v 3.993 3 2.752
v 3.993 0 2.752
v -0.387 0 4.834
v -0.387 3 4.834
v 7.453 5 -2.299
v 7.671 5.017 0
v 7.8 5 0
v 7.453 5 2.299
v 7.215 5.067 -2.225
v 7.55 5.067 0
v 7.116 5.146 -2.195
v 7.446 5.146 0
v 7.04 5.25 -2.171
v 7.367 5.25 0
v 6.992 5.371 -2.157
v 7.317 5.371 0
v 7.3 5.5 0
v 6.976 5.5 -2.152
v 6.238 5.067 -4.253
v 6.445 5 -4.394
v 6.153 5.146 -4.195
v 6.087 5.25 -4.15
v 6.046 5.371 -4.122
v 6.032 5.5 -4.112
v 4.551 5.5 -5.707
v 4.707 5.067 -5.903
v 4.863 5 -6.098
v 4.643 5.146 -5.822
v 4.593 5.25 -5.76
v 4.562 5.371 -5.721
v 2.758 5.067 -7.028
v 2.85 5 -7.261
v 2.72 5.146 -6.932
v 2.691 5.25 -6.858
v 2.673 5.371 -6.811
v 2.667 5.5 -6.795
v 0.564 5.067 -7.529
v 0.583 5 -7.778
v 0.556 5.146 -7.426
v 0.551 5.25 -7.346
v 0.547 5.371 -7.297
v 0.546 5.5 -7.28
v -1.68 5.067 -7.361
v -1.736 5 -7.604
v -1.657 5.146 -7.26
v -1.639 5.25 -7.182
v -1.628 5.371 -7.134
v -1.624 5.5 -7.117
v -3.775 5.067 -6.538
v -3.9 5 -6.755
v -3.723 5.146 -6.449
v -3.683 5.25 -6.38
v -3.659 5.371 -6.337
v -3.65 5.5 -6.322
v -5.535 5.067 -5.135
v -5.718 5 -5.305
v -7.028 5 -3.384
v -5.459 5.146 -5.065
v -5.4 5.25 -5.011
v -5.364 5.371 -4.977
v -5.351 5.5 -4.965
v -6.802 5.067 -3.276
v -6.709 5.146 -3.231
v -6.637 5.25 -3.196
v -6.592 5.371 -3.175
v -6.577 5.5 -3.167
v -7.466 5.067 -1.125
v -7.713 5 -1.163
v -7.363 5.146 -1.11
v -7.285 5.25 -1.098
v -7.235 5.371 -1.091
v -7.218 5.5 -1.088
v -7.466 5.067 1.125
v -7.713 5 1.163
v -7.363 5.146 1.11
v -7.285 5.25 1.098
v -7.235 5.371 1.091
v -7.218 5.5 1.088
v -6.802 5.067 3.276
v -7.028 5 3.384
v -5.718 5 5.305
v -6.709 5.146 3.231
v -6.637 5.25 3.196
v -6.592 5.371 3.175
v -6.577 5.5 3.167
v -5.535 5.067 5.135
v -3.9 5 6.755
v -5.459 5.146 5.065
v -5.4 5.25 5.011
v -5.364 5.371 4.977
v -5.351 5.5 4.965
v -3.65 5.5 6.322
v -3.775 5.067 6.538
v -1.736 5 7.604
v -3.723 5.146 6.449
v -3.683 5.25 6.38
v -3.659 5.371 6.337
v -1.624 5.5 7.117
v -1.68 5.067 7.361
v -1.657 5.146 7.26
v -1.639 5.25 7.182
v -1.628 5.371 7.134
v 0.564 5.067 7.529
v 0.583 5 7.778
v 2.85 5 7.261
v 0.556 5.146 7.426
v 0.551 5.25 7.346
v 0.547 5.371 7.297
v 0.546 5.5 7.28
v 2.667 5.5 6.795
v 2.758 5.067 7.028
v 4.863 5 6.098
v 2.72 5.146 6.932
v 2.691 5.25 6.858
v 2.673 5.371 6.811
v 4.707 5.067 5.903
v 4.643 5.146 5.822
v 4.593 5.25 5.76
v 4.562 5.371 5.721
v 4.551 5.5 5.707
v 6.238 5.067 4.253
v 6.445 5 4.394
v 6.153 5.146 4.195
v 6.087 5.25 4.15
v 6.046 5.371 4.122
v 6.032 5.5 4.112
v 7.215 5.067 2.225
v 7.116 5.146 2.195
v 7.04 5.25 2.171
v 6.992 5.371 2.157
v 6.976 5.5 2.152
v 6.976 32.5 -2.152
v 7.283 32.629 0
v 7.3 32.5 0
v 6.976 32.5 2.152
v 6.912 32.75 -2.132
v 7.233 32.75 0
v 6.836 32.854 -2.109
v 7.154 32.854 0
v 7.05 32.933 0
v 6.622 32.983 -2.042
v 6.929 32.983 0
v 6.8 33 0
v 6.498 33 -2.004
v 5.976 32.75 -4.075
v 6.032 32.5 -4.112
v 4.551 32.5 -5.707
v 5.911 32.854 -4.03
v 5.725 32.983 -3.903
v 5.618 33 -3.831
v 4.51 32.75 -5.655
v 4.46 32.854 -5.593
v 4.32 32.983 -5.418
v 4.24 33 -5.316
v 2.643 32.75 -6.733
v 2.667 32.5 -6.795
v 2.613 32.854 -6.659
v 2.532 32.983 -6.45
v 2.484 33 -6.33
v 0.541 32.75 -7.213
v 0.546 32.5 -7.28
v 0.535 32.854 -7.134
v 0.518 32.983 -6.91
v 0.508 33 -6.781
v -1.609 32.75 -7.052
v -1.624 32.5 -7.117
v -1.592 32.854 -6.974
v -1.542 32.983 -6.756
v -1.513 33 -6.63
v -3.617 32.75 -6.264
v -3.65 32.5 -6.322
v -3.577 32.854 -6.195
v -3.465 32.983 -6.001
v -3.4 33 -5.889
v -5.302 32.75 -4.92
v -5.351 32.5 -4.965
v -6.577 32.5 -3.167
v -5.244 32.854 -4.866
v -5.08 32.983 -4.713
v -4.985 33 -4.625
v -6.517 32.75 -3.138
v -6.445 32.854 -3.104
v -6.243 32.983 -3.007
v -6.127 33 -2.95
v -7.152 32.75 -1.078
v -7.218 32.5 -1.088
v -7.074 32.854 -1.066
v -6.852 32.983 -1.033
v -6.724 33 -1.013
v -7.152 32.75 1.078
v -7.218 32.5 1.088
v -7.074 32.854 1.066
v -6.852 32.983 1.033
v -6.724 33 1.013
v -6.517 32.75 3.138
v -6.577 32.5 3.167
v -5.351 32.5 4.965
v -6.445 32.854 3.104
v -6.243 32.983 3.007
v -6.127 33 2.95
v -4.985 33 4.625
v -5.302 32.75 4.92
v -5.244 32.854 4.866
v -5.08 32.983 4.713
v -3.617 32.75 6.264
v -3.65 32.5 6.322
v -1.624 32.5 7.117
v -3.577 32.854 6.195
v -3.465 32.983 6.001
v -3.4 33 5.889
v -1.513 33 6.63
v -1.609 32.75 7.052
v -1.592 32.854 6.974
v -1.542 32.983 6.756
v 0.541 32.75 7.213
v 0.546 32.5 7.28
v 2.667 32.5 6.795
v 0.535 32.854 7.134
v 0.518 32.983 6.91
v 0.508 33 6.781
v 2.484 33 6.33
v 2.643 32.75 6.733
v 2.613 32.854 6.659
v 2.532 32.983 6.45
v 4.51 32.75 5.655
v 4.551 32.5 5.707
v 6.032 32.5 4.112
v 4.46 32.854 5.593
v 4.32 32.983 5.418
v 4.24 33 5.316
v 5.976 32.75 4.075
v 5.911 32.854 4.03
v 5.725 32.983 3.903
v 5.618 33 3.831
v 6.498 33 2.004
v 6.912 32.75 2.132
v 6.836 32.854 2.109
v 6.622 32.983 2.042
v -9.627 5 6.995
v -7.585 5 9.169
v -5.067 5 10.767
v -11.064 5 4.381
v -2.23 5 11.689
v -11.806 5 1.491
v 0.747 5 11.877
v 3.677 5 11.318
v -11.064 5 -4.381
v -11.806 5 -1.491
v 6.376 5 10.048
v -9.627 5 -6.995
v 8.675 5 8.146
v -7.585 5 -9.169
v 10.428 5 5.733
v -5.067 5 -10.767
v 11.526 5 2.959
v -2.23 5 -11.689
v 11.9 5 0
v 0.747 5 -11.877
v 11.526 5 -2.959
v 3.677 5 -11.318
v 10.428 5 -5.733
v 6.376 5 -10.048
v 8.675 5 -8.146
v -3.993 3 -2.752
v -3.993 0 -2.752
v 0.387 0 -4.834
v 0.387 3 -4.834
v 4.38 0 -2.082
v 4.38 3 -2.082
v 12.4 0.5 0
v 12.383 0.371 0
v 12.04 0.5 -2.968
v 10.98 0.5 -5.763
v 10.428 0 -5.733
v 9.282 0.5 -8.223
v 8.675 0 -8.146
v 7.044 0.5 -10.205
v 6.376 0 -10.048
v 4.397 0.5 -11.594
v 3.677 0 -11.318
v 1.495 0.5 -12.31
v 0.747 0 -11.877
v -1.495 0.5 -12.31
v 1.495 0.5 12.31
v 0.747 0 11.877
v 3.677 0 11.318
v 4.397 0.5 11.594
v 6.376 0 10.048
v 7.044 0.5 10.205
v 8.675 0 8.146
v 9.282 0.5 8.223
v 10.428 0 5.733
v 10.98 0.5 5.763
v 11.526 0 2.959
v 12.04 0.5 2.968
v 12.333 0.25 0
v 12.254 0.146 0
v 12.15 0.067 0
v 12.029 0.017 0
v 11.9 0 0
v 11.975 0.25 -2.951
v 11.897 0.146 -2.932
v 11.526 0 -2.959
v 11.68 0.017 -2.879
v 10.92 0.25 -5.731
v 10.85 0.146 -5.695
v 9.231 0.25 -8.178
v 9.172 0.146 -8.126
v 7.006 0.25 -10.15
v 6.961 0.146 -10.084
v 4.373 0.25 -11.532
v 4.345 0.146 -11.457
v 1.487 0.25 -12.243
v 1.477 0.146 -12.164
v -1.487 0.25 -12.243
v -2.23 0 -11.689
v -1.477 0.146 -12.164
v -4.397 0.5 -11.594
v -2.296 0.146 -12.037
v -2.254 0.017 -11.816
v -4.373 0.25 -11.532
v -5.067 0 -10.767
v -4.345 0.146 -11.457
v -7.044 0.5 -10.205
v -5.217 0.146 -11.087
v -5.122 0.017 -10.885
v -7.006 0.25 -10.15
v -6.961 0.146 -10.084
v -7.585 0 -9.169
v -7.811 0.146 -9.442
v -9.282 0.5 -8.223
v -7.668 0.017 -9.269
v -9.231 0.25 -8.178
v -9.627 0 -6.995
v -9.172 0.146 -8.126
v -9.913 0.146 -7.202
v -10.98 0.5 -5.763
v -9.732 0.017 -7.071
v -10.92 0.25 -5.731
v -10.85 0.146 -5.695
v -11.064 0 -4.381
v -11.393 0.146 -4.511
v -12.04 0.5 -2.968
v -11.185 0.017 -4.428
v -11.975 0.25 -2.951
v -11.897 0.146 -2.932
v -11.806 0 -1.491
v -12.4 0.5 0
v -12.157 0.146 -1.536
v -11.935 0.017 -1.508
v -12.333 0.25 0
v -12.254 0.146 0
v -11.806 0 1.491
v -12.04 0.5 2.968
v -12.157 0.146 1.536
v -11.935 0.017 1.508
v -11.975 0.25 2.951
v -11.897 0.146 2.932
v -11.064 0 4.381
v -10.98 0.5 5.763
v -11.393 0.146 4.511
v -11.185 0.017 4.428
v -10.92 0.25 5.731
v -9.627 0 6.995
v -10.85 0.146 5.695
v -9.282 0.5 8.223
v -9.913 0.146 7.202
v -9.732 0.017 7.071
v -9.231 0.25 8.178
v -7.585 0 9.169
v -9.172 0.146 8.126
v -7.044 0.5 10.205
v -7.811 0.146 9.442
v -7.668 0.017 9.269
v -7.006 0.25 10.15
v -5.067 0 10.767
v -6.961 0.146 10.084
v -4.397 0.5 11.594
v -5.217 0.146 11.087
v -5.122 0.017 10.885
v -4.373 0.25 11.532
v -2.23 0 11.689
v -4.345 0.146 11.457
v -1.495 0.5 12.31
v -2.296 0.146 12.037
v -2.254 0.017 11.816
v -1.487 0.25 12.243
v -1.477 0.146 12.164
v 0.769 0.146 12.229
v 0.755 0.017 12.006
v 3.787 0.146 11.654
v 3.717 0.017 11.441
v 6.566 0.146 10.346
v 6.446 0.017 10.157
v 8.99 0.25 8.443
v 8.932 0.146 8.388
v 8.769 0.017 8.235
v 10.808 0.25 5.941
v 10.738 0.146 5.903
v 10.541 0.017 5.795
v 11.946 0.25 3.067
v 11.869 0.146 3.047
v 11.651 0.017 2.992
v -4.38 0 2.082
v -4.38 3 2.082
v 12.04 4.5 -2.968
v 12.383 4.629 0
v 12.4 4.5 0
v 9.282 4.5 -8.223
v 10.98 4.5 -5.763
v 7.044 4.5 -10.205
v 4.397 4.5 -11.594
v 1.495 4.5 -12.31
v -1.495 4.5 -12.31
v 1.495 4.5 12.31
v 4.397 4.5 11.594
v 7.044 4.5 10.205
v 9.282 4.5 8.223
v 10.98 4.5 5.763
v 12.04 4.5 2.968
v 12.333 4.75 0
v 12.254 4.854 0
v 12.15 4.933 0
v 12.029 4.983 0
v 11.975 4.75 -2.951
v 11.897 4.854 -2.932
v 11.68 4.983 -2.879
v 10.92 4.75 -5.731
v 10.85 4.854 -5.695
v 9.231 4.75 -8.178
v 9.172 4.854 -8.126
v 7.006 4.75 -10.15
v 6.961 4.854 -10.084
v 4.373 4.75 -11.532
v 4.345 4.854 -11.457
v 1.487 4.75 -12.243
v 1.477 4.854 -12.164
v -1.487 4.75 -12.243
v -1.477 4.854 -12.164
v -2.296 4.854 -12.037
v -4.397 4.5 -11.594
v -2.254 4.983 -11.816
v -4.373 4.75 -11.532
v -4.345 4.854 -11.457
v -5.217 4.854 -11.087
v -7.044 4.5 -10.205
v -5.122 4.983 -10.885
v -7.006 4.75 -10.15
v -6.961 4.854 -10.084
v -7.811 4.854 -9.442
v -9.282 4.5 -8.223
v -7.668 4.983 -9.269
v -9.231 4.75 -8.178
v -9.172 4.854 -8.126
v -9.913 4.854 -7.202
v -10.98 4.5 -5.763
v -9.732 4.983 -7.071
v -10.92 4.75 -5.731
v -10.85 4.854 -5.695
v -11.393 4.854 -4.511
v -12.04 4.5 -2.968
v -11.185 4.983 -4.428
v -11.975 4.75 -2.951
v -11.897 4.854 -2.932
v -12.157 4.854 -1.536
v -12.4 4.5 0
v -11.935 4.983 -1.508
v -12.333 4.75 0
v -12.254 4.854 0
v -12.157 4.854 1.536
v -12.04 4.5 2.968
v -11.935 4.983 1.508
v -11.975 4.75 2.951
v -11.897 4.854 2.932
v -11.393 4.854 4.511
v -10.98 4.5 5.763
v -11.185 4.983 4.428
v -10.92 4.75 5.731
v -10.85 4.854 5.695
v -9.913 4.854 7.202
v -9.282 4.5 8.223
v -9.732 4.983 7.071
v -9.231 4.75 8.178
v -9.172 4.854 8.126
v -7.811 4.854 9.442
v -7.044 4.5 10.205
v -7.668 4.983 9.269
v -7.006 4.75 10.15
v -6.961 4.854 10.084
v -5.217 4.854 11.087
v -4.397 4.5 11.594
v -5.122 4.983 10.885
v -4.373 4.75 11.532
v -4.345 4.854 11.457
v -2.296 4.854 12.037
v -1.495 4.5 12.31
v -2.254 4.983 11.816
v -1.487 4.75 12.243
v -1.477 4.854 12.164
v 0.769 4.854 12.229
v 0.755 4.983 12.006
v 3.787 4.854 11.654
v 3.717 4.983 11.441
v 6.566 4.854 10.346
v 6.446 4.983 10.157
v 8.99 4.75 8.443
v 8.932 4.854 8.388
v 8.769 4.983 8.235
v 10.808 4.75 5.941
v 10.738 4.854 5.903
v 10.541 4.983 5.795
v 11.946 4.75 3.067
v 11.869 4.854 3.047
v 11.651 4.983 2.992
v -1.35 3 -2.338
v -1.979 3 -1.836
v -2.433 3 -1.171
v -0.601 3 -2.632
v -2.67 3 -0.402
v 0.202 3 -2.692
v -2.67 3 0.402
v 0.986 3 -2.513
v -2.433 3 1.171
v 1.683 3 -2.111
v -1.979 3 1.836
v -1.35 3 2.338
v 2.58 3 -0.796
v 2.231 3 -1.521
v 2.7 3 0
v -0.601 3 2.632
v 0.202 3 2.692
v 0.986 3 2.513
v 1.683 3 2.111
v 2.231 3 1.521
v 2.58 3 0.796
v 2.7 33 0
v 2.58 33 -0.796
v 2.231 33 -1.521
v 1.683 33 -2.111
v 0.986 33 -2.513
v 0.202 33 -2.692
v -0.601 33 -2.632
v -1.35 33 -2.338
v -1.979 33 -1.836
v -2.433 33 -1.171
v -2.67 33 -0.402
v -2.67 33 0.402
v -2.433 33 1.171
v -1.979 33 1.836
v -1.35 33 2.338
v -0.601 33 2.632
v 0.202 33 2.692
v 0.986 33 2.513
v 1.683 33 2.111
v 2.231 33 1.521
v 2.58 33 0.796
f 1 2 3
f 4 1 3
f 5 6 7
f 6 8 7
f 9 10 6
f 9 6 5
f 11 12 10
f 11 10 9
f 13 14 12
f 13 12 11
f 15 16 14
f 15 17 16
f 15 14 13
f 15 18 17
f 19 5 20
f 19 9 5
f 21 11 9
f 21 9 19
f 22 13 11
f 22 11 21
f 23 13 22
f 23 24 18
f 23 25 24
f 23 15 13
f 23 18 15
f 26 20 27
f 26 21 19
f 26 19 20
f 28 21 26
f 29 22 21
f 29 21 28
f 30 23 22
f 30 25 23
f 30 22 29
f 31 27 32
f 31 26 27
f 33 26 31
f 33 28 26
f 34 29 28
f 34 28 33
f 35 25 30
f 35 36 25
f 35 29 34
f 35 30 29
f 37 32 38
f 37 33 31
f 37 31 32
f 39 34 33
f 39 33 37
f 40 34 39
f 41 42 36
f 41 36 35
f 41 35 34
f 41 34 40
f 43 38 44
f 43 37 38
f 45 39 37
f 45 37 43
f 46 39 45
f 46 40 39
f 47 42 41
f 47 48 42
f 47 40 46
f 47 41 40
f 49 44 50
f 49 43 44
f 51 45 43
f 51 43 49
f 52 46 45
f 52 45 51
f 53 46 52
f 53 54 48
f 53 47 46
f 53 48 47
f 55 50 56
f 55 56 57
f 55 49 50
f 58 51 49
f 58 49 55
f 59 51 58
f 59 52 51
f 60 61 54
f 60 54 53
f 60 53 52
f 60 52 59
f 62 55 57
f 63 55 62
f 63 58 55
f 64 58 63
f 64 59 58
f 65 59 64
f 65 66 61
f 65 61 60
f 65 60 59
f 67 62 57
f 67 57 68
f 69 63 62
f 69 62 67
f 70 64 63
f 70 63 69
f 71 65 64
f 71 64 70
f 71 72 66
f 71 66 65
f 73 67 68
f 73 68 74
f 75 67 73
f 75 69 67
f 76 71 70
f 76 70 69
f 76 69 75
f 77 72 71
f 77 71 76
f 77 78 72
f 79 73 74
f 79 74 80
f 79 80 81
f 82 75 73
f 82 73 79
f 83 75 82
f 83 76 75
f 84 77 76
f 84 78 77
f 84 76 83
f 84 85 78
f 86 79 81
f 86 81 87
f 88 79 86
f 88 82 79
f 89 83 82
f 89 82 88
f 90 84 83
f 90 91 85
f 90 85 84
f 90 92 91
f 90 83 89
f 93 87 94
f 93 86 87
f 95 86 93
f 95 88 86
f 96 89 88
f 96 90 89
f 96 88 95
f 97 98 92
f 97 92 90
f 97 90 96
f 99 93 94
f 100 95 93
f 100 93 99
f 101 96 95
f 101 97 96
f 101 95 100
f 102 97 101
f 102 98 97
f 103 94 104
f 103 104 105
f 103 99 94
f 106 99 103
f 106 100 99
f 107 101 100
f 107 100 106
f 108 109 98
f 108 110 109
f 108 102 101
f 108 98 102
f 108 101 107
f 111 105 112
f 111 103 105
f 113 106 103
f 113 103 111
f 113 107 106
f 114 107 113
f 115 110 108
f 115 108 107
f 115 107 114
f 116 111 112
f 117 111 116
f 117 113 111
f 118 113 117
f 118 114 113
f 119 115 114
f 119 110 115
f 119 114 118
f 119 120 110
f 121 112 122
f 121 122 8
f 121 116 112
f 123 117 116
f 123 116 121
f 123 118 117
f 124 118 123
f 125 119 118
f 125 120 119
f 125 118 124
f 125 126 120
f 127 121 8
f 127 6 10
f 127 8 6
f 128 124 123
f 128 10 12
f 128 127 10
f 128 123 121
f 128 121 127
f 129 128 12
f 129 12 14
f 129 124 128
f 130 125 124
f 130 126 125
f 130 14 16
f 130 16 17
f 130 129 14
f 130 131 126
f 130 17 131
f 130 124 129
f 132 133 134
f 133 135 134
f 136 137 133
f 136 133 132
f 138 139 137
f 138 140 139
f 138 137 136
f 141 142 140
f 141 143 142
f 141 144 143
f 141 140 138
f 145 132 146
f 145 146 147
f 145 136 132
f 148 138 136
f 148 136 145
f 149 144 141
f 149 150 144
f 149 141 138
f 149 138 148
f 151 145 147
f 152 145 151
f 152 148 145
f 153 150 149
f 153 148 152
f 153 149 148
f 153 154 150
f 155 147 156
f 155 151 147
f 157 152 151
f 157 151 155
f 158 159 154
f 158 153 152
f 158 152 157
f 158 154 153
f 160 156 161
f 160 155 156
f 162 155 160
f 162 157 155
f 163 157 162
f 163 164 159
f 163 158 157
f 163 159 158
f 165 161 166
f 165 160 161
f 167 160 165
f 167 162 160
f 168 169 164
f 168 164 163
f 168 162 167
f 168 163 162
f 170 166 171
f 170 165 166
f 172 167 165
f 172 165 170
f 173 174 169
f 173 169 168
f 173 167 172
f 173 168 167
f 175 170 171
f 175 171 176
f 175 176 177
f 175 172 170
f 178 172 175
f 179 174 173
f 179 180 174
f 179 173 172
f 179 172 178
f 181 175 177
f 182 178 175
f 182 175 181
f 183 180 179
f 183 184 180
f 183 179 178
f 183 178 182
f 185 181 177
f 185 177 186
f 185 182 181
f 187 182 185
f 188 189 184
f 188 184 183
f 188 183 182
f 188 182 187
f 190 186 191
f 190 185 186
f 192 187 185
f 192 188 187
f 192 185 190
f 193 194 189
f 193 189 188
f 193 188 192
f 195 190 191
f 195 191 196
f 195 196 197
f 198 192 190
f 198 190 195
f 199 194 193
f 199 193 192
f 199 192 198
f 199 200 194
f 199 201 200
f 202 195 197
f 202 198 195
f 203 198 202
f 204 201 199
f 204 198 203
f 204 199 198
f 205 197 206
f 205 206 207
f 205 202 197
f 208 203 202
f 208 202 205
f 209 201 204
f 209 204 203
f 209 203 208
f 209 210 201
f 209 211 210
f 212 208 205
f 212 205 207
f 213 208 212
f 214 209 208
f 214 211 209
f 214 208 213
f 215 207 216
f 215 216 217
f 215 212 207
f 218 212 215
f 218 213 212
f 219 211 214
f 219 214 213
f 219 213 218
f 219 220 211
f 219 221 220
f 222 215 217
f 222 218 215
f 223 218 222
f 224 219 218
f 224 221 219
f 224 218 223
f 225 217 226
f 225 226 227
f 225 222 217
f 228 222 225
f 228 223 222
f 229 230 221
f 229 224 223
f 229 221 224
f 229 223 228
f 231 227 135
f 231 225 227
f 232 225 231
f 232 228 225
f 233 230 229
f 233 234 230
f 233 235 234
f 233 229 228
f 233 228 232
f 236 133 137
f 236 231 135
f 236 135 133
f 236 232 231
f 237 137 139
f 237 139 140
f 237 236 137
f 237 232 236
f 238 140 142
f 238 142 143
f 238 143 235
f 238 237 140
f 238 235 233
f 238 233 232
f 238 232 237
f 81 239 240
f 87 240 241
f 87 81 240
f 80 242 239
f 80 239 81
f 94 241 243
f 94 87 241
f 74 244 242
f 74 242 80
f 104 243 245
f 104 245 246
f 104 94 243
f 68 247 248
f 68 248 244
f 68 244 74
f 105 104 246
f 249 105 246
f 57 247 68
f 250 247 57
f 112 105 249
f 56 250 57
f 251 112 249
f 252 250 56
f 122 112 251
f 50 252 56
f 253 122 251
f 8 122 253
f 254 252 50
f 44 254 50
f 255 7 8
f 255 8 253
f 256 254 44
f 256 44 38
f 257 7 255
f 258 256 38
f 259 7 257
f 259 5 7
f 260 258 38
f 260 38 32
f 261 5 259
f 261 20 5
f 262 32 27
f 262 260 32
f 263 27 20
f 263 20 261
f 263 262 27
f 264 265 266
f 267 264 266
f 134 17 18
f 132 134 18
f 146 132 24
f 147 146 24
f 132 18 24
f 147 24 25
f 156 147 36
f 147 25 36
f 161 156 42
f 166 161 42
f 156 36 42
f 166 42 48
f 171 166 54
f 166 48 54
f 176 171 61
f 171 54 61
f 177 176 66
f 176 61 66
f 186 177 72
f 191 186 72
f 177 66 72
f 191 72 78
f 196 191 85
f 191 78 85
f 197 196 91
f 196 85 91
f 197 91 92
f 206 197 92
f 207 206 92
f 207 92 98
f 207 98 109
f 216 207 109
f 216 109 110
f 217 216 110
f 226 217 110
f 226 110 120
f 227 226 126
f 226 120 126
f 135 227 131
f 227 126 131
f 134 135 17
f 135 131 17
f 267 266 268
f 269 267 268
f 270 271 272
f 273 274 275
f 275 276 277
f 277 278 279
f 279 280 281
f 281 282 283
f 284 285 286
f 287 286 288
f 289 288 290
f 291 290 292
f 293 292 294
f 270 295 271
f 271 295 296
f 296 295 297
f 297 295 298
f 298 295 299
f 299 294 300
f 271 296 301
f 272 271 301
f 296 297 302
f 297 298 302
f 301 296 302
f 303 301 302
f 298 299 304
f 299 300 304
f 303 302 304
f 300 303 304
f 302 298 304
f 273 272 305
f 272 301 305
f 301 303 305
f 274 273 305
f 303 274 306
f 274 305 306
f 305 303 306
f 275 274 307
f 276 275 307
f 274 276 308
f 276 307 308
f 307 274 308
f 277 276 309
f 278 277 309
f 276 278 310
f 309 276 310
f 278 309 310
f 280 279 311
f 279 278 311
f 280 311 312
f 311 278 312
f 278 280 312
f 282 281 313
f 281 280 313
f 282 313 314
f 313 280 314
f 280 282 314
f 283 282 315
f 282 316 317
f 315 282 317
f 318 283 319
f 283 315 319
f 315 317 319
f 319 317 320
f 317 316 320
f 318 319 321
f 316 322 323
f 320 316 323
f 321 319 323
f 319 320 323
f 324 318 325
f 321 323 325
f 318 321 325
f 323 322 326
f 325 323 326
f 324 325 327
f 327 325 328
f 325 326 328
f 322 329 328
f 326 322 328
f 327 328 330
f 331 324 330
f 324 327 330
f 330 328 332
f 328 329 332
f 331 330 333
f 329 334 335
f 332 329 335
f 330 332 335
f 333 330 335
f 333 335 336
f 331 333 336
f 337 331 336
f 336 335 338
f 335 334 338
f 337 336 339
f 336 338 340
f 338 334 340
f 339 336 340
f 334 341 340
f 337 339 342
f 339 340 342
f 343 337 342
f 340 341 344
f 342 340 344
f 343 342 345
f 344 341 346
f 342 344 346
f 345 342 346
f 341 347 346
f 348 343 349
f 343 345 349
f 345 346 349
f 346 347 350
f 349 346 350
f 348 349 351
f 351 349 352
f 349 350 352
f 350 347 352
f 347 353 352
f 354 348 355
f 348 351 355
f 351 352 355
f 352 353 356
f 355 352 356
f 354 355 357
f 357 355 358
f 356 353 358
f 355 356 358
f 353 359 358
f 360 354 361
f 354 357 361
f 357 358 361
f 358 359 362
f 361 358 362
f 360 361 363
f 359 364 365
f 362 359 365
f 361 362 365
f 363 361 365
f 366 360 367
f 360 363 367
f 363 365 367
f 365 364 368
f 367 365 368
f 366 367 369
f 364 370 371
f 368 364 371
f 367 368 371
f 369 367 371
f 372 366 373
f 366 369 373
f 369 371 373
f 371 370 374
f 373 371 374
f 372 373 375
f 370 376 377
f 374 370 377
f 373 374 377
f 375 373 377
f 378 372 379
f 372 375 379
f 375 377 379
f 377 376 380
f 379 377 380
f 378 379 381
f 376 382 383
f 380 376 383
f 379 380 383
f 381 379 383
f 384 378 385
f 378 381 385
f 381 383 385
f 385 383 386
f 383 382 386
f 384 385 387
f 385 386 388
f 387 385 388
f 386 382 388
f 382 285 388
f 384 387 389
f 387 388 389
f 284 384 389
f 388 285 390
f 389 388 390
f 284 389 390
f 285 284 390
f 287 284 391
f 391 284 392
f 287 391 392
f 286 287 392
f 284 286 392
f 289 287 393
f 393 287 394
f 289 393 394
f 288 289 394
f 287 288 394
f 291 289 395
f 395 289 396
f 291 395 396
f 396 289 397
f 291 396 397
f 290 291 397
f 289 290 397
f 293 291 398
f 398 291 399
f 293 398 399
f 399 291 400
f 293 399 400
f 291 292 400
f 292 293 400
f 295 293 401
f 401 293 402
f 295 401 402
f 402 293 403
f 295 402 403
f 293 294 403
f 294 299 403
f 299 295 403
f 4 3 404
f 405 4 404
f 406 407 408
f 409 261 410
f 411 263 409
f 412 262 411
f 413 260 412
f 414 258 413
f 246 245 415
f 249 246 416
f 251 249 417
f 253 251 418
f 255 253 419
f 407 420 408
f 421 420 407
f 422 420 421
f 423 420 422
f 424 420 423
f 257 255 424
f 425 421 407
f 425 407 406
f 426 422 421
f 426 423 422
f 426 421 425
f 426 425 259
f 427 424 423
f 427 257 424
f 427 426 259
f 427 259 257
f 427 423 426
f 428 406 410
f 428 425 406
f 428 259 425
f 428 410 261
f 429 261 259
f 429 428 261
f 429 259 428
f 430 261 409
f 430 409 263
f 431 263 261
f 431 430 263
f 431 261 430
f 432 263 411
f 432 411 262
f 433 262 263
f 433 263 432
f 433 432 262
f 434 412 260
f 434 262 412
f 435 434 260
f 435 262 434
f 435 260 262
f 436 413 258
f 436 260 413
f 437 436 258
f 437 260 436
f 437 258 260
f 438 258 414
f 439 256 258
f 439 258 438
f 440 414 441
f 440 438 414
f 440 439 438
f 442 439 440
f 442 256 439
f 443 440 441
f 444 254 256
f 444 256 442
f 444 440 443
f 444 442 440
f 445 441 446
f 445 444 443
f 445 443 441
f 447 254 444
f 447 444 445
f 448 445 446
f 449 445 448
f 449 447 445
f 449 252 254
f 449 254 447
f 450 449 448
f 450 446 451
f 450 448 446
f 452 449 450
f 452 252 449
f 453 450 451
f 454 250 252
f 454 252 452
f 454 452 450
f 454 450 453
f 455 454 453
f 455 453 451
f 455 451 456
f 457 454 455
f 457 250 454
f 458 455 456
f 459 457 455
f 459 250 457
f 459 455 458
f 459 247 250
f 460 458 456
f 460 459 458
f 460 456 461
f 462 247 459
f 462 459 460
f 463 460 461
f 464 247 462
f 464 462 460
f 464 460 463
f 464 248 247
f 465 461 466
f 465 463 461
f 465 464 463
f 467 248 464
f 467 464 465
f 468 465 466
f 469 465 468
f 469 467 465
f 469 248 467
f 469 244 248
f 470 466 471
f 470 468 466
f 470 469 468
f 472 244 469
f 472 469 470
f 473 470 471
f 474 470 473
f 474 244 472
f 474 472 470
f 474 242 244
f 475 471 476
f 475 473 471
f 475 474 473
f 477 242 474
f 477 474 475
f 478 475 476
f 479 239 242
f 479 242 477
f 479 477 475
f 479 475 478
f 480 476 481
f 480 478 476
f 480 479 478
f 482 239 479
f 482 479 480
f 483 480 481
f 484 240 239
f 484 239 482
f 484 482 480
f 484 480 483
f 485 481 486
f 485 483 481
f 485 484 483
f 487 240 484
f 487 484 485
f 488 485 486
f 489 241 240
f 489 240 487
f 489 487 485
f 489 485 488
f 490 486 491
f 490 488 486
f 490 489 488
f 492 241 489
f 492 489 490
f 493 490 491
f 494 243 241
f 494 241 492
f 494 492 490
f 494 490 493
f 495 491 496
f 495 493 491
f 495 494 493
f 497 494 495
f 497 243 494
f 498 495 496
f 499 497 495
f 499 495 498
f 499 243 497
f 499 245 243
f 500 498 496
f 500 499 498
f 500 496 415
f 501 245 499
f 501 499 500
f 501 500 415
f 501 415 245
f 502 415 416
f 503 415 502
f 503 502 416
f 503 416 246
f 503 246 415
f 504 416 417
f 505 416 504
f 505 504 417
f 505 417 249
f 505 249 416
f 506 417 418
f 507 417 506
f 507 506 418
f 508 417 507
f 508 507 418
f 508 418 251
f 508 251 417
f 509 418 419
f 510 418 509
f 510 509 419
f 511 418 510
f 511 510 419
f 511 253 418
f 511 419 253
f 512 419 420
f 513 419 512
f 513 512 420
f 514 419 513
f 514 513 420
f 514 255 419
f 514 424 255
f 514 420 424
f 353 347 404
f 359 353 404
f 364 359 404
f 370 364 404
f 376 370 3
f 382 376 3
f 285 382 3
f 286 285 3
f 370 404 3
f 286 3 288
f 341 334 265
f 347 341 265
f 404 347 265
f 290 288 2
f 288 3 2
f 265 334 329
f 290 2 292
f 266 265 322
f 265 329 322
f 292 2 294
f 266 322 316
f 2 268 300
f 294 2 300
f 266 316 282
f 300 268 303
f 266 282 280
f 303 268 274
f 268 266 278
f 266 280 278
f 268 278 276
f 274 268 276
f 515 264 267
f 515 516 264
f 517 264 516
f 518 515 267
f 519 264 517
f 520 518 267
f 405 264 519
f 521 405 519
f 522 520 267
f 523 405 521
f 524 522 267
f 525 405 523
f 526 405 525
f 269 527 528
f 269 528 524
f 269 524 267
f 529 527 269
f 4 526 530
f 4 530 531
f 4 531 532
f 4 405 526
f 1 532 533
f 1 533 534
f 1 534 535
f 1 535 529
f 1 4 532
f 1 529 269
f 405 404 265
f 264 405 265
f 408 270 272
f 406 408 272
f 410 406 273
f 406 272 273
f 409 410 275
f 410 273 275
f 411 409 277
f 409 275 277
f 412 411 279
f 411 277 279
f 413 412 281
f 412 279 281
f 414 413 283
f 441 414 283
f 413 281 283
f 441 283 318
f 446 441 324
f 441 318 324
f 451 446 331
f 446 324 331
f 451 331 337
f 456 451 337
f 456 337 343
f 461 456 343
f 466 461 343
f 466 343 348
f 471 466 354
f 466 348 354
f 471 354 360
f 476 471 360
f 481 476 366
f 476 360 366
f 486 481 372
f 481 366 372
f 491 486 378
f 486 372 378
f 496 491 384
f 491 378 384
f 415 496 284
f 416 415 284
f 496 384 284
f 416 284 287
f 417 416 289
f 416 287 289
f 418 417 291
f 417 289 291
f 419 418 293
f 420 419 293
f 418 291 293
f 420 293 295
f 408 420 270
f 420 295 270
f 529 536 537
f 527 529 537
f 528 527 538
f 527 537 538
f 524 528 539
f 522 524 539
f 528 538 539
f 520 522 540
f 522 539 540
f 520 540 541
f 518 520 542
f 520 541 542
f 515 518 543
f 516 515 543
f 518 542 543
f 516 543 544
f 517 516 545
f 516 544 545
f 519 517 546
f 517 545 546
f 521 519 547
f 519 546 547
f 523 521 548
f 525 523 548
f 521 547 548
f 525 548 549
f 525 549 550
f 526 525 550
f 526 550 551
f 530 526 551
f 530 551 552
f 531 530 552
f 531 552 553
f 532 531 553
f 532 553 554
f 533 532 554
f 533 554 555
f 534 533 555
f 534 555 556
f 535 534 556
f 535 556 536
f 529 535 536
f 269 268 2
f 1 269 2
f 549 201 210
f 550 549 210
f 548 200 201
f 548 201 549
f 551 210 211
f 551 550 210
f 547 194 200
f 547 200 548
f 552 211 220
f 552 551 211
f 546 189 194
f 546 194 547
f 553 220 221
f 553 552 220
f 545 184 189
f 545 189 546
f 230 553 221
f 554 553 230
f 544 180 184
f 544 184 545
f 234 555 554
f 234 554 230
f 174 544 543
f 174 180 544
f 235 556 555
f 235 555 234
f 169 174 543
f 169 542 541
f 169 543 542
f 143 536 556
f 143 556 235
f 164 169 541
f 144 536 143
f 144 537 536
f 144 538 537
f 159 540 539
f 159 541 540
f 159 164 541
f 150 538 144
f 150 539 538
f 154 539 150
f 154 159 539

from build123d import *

# Parameters (mm, degrees)
SKETCH1_R           = 12.4
BOSS_EXTRUDE1_DEPTH = 5
SKETCH2_R           = 7.3
BOSS_EXTRUDE2_DEPTH = 28
SKETCH3_R           = 2.7
CUT_EXTRUDE1_DEPTH  = 34
CUT_EXTRUDE2_DEPTH  = 3
FILLET1_R           = 0.5


with BuildPart() as part:
    # Sketch1 → Boss-Extrude1 (new body)
    with BuildSketch(Plane(origin=(0, 0, 0), x_dir=(1, 0, 0), z_dir=(0, 1, 0))):
        Circle(SKETCH1_R)
    extrude(amount=BOSS_EXTRUDE1_DEPTH)

    # Sketch2 → Boss-Extrude2 (add)
    with BuildSketch(Plane(origin=(0, 5, 0), x_dir=(1, 0, 0), z_dir=(0, 1, 0))):
        Circle(SKETCH2_R)
    extrude(amount=BOSS_EXTRUDE2_DEPTH)

    # Sketch3 → Cut-Extrude1 (cut, through all)
    with BuildSketch(Plane(origin=(0, 33, 0), x_dir=(1, 0, 0), z_dir=(0, 1, 0))):
        Circle(SKETCH3_R)
    extrude(amount=-CUT_EXTRUDE1_DEPTH, mode=Mode.SUBTRACT)

    # Sketch4 → Cut-Extrude2 (cut)
    with BuildSketch(Plane.XZ):
        Polygon((-4.38019792, 2.081793981), (-3.992985433, -2.752465682), (0.387212487, -4.834259663), (4.38019792, -2.081793981), (3.992985433, 2.752465682), (-0.387212487, 4.834259663), align=None)
    extrude(amount=-CUT_EXTRUDE2_DEPTH, mode=Mode.SUBTRACT)

    # Fillet1
    fillet1_edges = [part.edges().sort_by_distance(p)[0] for p in [
        (-12.4, 0, 0),
        (-12.4, 5, 0),
        (-7.3, 5, 0),
        (-7.3, 33, 0),
    ]]
    fillet(fillet1_edges, radius=FILLET1_R)


solid = part.part
